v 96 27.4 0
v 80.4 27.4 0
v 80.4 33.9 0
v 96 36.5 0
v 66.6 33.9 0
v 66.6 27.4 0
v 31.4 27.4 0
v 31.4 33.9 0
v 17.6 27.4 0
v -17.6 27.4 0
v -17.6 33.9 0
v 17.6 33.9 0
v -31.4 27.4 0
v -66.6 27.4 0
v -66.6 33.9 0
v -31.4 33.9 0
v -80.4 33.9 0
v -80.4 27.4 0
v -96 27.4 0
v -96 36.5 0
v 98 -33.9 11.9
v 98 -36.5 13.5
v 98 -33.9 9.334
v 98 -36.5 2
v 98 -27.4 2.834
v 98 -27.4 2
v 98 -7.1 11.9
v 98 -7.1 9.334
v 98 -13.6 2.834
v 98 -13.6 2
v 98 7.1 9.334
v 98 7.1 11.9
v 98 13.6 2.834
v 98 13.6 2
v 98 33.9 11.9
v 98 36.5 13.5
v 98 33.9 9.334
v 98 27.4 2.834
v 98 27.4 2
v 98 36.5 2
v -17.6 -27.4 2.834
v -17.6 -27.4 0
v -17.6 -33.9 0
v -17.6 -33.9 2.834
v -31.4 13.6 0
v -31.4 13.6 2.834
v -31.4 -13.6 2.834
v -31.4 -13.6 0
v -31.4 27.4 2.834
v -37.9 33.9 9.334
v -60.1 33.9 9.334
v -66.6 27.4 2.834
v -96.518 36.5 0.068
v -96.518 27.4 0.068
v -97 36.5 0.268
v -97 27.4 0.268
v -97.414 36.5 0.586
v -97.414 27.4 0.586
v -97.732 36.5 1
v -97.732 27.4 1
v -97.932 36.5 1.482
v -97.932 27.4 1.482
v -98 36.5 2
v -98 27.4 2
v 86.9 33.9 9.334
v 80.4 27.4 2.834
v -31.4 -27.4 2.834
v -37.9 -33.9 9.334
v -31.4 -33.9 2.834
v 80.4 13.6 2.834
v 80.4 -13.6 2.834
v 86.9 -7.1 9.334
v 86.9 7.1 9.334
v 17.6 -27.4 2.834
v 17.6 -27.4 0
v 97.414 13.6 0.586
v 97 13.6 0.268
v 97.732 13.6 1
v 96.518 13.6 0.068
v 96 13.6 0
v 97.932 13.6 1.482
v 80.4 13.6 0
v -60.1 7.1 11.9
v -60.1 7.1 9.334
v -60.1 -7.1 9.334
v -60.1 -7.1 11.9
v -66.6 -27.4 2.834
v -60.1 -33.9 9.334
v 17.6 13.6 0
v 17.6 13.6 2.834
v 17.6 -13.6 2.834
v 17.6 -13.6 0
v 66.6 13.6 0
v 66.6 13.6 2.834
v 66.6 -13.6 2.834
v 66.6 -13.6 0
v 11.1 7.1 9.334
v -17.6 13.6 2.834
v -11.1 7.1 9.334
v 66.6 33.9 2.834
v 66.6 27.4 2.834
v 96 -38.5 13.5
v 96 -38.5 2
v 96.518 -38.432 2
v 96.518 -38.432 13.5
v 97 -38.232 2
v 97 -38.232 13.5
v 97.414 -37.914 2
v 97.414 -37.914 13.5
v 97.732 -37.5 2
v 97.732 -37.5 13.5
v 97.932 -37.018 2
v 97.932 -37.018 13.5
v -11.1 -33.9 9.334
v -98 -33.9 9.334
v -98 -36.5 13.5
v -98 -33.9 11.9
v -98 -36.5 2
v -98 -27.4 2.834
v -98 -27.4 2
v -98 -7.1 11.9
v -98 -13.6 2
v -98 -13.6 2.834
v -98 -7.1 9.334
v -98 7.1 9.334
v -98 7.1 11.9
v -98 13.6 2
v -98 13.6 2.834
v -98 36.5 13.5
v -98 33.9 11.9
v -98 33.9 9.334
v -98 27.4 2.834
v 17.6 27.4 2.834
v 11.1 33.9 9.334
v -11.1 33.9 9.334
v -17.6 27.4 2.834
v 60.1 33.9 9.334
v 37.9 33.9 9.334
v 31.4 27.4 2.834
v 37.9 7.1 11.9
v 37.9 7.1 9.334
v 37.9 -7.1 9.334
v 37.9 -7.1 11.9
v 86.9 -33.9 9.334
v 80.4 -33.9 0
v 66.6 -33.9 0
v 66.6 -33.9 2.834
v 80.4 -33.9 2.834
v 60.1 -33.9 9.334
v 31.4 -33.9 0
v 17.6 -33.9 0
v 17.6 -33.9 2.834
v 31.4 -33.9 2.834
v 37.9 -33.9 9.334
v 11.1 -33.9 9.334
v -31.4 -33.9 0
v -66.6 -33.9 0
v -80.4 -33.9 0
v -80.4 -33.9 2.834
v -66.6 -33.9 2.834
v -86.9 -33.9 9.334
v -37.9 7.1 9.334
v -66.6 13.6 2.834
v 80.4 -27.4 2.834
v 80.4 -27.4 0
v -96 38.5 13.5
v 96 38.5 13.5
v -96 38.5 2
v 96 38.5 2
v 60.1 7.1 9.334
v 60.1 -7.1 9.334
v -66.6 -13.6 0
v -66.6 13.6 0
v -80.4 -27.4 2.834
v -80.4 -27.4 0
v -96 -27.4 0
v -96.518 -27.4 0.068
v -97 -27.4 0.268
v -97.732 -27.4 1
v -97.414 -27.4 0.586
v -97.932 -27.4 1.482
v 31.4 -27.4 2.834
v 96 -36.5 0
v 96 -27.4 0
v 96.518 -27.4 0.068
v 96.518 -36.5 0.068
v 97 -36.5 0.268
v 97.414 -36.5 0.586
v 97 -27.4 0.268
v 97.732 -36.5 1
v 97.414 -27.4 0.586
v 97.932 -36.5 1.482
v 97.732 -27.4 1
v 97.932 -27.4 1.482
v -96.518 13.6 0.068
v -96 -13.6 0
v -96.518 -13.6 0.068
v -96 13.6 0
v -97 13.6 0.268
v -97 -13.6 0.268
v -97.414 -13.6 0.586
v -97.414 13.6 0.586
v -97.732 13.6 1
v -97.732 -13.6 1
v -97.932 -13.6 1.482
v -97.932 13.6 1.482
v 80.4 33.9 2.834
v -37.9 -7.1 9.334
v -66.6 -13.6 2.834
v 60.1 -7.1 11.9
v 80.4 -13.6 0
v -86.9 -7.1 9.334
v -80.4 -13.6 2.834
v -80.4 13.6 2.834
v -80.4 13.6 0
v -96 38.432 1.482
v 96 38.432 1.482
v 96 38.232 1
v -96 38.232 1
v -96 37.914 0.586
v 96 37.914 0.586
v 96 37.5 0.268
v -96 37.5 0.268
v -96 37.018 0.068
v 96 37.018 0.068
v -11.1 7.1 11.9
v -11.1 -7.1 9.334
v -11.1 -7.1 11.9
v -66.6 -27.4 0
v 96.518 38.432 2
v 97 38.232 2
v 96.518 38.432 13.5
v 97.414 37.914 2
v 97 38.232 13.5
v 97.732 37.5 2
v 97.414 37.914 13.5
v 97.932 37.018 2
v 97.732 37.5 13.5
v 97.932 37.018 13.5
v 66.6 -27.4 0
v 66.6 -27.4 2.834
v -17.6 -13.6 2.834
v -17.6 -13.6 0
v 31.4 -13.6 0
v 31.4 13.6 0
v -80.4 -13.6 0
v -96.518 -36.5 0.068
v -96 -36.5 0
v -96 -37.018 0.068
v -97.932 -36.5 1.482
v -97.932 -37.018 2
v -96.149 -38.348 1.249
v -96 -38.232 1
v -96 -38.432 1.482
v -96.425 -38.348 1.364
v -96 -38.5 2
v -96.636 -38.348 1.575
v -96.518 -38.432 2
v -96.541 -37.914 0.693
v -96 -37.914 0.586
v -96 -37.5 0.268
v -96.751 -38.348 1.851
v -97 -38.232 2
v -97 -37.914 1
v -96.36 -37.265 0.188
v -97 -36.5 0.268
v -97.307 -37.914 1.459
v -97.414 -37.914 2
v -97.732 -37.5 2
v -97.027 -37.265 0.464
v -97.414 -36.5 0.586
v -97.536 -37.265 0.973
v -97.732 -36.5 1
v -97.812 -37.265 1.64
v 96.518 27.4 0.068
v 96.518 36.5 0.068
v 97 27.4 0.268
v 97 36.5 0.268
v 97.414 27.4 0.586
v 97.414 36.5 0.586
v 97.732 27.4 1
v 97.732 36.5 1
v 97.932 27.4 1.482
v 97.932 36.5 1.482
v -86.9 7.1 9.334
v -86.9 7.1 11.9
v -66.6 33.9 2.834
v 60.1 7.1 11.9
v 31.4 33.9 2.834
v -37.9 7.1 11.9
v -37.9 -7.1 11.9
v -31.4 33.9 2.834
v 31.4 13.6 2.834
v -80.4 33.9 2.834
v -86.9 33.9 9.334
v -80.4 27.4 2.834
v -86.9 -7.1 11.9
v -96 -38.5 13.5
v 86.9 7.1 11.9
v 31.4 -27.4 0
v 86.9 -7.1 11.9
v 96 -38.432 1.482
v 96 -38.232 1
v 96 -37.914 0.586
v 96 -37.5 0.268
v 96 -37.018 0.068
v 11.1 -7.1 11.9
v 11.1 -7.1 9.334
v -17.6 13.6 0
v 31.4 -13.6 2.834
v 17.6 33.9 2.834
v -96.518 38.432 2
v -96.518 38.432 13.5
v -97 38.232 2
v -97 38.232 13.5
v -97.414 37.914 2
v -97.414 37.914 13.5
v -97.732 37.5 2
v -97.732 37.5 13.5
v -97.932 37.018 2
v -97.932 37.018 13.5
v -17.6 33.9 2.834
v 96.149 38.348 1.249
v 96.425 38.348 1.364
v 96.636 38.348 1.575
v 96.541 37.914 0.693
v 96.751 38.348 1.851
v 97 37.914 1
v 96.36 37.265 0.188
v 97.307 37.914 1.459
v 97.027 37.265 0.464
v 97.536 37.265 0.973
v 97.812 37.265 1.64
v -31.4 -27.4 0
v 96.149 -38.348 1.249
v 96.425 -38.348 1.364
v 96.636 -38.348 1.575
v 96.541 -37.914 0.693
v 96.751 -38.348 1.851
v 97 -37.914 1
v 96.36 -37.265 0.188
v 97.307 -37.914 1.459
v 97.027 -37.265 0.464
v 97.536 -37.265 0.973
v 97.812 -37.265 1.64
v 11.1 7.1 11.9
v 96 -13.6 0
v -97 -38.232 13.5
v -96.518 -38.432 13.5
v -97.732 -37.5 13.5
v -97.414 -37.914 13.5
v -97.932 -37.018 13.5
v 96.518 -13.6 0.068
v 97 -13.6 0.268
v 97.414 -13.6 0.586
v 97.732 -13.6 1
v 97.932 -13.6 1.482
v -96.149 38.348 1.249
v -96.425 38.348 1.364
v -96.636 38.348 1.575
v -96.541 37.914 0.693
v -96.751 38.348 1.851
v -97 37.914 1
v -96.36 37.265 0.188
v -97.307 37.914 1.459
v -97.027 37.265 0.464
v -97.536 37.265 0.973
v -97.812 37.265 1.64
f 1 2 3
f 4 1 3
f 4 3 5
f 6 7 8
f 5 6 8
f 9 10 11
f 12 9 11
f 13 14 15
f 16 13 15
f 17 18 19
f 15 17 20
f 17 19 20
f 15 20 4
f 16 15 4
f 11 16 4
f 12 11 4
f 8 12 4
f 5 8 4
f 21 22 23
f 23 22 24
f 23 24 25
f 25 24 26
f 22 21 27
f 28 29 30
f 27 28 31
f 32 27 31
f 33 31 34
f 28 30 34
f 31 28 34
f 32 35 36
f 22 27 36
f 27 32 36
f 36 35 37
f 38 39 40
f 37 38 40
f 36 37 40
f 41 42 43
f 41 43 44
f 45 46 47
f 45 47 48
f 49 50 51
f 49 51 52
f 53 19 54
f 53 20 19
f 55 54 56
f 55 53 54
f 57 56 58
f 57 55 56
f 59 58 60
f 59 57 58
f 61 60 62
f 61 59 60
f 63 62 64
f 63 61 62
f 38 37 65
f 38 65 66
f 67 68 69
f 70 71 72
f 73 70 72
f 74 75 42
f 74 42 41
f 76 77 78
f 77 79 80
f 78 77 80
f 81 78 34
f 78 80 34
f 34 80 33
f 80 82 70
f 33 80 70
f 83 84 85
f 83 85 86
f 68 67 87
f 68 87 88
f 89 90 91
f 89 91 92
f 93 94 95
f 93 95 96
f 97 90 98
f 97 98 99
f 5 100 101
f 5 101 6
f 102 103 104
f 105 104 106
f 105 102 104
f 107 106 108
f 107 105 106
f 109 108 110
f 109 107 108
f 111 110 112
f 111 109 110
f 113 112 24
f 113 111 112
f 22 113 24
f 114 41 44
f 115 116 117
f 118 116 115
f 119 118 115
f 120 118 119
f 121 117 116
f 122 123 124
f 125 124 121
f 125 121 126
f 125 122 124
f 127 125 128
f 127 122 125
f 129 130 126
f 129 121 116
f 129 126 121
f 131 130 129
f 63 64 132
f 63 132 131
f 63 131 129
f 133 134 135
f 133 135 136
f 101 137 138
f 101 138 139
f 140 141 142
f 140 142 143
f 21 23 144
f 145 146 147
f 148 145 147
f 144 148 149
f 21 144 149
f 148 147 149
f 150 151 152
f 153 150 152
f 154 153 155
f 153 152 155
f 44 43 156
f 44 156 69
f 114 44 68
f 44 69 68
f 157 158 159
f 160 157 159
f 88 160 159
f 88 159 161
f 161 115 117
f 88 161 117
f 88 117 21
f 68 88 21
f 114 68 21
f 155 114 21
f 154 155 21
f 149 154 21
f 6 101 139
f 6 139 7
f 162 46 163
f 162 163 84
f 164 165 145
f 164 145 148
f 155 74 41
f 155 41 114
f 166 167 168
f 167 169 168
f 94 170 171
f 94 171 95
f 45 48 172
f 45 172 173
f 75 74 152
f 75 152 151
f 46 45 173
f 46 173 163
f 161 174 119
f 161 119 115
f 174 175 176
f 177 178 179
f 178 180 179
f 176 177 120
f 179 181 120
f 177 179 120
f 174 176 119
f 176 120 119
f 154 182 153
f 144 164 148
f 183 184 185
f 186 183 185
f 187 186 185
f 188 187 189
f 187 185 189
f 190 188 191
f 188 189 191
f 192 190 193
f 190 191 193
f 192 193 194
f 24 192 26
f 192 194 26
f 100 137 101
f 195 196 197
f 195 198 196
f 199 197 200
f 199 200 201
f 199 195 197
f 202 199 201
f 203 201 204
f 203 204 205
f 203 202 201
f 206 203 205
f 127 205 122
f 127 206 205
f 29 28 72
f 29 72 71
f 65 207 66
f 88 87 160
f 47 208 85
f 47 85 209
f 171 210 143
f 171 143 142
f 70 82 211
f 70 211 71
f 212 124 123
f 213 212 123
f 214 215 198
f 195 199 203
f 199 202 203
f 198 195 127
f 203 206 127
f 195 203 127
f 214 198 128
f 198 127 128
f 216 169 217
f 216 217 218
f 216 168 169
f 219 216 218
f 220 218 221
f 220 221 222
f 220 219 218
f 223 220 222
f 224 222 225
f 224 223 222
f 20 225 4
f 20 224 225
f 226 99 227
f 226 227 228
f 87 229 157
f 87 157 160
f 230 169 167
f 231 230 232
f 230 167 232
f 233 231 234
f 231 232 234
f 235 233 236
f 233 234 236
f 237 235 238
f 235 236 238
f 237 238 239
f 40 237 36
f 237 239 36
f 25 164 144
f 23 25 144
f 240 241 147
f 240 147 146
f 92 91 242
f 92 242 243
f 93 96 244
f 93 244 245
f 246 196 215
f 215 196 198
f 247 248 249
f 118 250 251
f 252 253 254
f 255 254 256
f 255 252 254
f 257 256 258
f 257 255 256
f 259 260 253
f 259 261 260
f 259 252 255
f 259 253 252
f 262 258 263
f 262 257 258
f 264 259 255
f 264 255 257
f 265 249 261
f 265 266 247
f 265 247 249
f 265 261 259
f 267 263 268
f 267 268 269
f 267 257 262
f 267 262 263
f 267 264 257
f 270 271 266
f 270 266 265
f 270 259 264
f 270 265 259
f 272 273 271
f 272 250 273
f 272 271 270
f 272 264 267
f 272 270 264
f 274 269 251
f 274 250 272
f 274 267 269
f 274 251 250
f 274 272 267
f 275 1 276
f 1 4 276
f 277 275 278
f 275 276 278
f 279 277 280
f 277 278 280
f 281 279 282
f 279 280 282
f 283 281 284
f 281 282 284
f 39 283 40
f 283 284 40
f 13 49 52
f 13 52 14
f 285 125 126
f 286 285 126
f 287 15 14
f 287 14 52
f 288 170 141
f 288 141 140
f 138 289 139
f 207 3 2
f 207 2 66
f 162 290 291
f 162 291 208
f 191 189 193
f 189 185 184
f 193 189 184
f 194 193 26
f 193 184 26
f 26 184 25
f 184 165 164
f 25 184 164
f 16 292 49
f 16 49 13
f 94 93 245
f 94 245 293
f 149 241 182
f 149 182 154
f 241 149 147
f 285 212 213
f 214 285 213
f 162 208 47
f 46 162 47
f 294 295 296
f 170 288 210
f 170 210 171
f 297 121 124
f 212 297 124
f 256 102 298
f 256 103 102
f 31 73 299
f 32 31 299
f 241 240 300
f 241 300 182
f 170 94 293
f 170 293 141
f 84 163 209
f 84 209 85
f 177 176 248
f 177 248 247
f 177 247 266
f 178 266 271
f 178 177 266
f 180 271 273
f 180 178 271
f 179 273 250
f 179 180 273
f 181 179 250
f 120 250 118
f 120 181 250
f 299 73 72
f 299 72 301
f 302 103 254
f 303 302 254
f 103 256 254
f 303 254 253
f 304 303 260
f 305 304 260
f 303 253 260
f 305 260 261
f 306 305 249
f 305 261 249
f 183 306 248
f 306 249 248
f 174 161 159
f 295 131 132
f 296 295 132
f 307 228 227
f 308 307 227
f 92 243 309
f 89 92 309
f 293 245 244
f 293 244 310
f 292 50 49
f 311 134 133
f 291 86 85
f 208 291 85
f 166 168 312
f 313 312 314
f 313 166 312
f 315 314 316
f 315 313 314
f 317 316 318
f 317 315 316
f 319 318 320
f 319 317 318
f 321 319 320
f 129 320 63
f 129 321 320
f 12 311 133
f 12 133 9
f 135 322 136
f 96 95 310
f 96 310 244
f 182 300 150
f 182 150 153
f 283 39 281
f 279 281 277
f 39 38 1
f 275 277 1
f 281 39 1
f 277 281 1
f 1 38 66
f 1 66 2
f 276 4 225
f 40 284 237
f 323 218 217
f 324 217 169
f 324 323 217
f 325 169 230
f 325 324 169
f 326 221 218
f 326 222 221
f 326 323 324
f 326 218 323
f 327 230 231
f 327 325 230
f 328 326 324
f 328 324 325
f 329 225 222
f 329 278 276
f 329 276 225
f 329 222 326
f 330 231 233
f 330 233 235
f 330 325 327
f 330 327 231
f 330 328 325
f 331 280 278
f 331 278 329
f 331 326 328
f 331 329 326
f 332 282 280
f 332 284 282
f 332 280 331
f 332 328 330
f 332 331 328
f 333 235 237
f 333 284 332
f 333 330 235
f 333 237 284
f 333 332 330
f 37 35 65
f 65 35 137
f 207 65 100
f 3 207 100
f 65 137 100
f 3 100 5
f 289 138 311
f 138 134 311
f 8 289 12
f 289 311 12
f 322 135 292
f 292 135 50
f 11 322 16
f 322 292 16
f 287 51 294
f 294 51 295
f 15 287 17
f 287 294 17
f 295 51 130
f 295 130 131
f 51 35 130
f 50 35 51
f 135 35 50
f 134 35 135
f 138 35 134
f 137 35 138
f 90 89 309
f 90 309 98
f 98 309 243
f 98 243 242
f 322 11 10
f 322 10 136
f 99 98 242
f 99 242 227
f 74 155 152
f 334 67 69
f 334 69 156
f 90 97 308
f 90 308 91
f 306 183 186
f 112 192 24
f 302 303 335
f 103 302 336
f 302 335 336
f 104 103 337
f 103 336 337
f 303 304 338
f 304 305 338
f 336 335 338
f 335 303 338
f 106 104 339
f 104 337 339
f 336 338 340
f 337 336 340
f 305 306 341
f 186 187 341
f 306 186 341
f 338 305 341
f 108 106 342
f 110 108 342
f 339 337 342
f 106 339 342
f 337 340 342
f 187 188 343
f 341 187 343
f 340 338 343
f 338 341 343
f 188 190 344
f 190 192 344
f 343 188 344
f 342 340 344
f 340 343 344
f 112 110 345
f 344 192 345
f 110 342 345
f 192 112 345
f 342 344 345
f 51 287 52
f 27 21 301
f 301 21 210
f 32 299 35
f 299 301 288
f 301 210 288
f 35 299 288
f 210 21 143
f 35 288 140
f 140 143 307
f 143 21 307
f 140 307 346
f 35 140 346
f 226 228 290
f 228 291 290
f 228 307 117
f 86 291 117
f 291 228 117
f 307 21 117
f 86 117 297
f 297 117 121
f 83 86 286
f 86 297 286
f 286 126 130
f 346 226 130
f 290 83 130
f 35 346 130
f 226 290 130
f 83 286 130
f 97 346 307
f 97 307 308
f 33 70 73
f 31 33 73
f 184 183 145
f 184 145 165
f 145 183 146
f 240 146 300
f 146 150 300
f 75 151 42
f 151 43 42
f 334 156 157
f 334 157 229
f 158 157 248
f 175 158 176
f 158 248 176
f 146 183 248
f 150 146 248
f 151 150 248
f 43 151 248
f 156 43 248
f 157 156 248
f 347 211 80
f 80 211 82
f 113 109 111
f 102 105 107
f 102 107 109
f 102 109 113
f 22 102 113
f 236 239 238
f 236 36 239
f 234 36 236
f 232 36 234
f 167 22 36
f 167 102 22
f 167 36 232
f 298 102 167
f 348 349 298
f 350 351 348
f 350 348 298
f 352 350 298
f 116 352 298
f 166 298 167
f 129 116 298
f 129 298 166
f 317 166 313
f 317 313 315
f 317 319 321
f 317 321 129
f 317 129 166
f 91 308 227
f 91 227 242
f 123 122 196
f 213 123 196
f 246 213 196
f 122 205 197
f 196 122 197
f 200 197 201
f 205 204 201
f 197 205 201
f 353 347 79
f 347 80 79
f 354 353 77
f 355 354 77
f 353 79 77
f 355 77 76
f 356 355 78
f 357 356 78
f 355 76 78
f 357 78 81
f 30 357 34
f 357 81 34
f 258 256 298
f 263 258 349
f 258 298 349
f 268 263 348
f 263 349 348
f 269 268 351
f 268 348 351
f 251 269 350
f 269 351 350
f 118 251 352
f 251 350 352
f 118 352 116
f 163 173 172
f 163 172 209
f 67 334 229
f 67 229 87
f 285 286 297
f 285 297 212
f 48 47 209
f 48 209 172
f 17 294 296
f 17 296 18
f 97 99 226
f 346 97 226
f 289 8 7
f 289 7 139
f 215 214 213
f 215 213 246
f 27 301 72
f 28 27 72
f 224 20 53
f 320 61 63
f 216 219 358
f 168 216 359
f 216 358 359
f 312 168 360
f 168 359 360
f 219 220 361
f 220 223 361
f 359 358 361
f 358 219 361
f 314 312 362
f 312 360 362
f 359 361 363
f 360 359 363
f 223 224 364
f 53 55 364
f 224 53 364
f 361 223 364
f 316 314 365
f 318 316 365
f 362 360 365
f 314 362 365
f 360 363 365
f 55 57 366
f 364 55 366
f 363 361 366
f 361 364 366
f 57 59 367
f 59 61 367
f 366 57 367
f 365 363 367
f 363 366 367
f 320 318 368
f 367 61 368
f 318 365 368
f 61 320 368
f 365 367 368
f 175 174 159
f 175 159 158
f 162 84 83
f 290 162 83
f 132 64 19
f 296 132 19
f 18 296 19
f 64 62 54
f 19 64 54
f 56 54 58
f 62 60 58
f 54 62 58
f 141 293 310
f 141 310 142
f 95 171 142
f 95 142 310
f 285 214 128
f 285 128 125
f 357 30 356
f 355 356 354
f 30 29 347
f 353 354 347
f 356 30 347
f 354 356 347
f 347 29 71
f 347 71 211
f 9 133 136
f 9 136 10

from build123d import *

# Parameters (mm, degrees)
SKETCH1_W           = 77
SKETCH1_H           = 196
BOSS_EXTRUDE1_DEPTH = 13.5
CUT_EXTRUDE1_DEPTH  = 201.201148848
CUT_EXTRUDE2_START  = -72.4
CUT_EXTRUDE2_DEPTH  = 67.8
FILLET1_R           = 2


with BuildPart() as part:
    # Sketch1 → Boss-Extrude1 (new body)
    with BuildSketch(Plane(origin=(0, 0, 0), x_dir=(0, 1, 0), z_dir=(0, 0, 1))):
        Rectangle(SKETCH1_W, SKETCH1_H)
    extrude(amount=BOSS_EXTRUDE1_DEPTH)

    # Sketch2 → Cut-Extrude1 (cut, through all)
    with BuildSketch(Plane(origin=(-98, 0, 0), x_dir=(0, -1, 0), z_dir=(-1, 0, 0))):
        Polygon((13.6, 2.834314575), (13.6, 0), (27.4, 0), (27.4, 2.834314575), (33.9, 9.334314575), (33.9, 11.9), (7.1, 11.9), (7.1, 9.334314575), align=None)
        Polygon((-27.4, 2.834314575), (-27.4, 0), (-13.6, 0), (-13.6, 2.834314575), (-7.1, 9.334314575), (-7.1, 11.9), (-33.9, 11.9), (-33.9, 9.334314575), align=None)
    extrude(amount=-CUT_EXTRUDE1_DEPTH, mode=Mode.SUBTRACT)

    # Sketch3 → Cut-Extrude2 (cut)
    with BuildSketch(Plane.XZ.offset(38.5).offset(CUT_EXTRUDE2_START)):
        Polygon((-80.4, 2.834314575), (-80.4, 0), (-66.6, 0), (-66.6, 2.834314575), (-60.1, 9.334314575), (-60.1, 11.9), (-86.9, 11.9), (-86.9, 9.334314575), align=None)
        Polygon((-31.4, 2.834314575), (-31.4, 0), (-17.6, 0), (-17.6, 2.834314575), (-11.1, 9.334314575), (-11.1, 11.9), (-37.9, 11.9), (-37.9, 9.334314575), align=None)
        Polygon((17.6, 2.834314575), (17.6, 0), (31.4, 0), (31.4, 2.834314575), (37.9, 9.334314575), (37.9, 11.9), (11.1, 11.9), (11.1, 9.334314575), align=None)
        Polygon((66.6, 0), (80.4, 0), (80.4, 2.834314575), (86.9, 9.334314575), (86.9, 11.9), (60.1, 11.9), (60.1, 9.334314575), (66.6, 2.834314575), align=None)
    extrude(amount=CUT_EXTRUDE2_DEPTH, mode=Mode.SUBTRACT)

    # Fillet1
    fillet1_edges = [part.edges().sort_by_distance(p)[0] for p in [
        (98, 0, 0),
        (98, 32.95, 0),
        (-98, 0, 0),
        (-98, -32.95, 0),
        (98, -32.95, 0),
        (0, -38.5, 0),
        (-98, 32.95, 0),
        (0, 38.5, 0),
        (98, 38.5, 6.75),
        (98, -38.5, 6.75),
        (-98, -38.5, 6.75),
        (-98, 38.5, 6.75),
    ]]
    fillet(fillet1_edges, radius=FILLET1_R)


solid = part.part
